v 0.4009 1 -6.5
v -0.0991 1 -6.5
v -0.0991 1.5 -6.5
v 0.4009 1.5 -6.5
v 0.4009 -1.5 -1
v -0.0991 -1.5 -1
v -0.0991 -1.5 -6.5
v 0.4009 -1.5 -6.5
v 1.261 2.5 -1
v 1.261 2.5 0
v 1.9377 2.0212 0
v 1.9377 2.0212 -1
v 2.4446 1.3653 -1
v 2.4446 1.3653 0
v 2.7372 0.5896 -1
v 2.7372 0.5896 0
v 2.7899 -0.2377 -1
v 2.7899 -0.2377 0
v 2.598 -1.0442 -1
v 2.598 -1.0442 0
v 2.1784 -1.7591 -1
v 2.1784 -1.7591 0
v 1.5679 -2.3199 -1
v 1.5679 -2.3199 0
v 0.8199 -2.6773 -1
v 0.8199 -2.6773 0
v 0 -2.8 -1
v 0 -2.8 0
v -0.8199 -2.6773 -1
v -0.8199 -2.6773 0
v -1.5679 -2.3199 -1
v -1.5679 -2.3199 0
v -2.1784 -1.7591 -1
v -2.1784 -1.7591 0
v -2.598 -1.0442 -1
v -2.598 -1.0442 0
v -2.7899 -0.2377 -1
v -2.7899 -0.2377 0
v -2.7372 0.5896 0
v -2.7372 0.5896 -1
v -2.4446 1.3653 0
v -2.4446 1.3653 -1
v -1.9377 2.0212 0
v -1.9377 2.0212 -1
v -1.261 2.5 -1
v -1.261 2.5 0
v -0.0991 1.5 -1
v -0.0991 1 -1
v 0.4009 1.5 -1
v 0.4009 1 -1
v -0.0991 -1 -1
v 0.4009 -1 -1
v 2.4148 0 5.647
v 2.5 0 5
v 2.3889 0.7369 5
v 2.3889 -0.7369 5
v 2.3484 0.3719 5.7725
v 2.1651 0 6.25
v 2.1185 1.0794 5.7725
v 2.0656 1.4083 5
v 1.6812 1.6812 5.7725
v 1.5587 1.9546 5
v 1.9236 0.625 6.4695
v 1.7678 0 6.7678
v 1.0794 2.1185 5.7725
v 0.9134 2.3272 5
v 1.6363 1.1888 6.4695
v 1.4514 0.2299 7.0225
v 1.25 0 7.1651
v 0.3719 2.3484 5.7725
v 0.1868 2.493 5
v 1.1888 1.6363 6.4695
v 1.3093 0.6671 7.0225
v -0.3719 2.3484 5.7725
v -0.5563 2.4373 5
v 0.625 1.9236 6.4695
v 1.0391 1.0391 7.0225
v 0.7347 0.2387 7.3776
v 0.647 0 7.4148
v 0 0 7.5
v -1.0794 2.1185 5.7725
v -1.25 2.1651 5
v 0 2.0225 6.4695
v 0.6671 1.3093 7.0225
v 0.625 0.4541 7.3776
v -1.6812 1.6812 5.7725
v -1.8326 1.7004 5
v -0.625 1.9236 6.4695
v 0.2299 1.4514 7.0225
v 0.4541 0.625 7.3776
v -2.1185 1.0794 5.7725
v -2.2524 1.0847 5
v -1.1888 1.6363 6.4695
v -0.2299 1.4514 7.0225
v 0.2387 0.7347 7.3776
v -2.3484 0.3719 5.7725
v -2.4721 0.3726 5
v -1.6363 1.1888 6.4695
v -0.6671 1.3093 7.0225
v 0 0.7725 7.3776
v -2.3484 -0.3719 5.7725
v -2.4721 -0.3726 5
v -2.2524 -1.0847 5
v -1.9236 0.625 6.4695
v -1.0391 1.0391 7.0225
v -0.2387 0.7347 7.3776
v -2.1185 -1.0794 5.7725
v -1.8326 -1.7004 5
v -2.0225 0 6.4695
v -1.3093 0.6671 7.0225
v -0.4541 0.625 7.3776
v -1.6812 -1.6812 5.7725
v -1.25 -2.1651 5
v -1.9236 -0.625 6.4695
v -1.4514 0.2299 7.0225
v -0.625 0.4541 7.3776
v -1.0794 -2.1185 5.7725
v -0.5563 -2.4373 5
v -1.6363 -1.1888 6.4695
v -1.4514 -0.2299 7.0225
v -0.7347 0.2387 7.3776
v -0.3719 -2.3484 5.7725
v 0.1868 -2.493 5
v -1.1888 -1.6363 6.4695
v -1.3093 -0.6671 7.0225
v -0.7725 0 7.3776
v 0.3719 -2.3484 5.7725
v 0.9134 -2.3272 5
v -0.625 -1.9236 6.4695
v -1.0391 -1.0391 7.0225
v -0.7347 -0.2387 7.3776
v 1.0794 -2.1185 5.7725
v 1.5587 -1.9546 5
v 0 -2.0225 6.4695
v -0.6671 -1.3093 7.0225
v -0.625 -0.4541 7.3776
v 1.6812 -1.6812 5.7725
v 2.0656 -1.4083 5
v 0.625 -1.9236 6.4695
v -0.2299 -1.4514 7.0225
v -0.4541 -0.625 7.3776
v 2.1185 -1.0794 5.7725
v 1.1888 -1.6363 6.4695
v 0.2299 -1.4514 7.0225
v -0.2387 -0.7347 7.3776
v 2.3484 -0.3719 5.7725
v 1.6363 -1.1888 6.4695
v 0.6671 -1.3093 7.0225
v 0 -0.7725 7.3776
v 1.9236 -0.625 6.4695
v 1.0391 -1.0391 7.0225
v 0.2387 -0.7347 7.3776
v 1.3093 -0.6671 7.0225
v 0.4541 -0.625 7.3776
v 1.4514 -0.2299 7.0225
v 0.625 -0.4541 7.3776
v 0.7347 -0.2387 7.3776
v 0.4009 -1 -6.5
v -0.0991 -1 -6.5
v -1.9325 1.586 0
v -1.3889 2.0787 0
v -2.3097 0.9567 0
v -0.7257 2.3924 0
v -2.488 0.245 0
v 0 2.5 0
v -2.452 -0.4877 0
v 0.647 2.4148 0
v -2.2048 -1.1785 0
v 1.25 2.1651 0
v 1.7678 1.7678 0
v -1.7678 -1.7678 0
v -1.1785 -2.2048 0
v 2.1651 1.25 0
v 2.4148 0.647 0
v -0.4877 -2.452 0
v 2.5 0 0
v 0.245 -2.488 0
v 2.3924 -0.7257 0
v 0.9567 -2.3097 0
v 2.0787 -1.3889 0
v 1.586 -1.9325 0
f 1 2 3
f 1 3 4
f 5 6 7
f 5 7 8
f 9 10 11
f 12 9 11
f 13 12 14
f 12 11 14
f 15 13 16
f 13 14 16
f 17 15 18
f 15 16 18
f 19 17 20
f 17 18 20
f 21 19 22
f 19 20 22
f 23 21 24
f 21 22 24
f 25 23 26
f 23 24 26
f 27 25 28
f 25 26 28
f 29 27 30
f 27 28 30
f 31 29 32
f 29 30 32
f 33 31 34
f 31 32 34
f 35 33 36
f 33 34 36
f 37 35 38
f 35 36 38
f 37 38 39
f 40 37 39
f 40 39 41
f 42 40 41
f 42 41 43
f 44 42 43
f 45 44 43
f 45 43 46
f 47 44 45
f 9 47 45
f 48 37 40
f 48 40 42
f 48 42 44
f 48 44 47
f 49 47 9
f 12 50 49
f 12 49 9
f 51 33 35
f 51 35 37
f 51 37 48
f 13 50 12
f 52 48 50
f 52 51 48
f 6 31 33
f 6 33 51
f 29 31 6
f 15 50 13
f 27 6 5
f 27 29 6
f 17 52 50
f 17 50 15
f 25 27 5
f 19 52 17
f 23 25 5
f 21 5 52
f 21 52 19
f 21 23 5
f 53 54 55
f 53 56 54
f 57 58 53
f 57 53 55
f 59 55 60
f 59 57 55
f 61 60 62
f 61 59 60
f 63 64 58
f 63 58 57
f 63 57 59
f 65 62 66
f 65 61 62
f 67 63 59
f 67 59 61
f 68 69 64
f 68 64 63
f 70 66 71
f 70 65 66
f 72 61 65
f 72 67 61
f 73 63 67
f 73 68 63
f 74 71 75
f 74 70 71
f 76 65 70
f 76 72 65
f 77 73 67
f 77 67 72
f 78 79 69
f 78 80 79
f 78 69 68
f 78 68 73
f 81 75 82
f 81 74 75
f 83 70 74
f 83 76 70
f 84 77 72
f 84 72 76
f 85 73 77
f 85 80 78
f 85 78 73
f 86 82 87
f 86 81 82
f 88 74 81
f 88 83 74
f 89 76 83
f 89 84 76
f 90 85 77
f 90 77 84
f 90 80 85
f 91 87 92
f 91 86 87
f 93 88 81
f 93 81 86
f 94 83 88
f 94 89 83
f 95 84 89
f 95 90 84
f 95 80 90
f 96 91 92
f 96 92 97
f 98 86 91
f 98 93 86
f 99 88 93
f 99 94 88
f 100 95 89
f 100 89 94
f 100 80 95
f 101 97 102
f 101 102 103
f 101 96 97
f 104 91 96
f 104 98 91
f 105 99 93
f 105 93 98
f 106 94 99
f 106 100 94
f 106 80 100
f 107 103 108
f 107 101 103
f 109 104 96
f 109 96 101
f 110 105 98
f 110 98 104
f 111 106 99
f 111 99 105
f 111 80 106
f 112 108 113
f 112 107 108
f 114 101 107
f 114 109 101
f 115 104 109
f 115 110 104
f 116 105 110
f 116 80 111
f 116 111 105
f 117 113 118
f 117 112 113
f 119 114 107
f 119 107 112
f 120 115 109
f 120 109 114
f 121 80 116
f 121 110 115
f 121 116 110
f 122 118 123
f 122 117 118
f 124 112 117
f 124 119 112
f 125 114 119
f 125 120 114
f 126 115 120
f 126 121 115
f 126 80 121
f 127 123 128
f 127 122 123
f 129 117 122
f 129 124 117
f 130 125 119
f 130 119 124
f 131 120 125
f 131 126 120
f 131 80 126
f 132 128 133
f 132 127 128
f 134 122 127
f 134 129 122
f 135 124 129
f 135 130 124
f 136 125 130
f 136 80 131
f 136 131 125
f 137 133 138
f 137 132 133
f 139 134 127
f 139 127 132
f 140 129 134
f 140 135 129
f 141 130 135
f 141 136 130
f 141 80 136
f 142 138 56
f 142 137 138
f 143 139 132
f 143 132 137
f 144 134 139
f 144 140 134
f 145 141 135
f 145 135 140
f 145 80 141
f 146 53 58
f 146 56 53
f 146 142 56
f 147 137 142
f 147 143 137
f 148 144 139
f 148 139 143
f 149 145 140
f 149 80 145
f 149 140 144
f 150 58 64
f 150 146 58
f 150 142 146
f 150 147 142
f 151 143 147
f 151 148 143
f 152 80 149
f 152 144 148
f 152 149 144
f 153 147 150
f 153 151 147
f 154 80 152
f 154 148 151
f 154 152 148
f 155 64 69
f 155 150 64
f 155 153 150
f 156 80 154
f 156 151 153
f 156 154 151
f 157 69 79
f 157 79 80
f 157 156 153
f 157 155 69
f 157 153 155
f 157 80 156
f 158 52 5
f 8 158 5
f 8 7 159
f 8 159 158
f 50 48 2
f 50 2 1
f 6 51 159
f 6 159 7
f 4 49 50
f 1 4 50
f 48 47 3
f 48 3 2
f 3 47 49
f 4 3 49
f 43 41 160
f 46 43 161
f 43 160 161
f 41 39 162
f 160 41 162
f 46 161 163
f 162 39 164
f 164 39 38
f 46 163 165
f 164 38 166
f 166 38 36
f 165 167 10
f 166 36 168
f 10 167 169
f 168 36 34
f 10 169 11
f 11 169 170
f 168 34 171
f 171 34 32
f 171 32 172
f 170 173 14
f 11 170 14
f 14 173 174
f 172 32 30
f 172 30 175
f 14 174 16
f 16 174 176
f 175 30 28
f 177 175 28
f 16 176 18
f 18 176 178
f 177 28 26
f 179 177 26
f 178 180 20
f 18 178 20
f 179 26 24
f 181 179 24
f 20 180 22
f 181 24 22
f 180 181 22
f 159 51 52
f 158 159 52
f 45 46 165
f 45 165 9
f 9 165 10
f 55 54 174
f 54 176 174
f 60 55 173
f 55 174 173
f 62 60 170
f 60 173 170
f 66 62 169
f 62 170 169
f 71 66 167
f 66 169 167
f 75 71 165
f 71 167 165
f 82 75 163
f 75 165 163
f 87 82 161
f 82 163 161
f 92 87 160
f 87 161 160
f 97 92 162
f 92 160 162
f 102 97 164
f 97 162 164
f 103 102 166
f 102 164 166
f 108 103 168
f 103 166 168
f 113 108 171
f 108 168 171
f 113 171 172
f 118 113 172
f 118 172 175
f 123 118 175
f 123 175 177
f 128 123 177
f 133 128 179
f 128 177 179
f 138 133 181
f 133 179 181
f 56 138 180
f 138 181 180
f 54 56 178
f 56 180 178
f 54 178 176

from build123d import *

# Parameters (mm, degrees)
F0_R     = 2.5
F1_DEPTH = 7.5
F2_R     = 2.5
F4_DEPTH = 1
F6_W     = 0.5
F6_H     = 0.5
F7_DEPTH = 5.5


with BuildPart() as f1:
    # F0 (on Top) → F1 (new body)
    with BuildSketch(Plane.XY):
        Circle(F0_R)
    extrude(amount=F1_DEPTH)

    # F2
    f2_edges = [f1.edges().sort_by_distance(p)[0] for p in [
        (-2.5, 0, 7.5),
    ]]
    fillet(f2_edges, radius=F2_R)

    # F3 (on face) → F4 (join)
    with BuildSketch(Plane(origin=(0, 0, 0), x_dir=(1, 0, 0), z_dir=(0, 0, -1))):
        with BuildLine():
            Line((-1.2609520213, -2.5), (1.2609520213, -2.5))
            ThreePointArc((1.2609520213, -2.5), (0, 2.8), (-1.2609520213, -2.5))
        make_face()
    extrude(amount=F4_DEPTH)

    # F6 (on offset) → F7 (join)
    with BuildSketch(Plane(origin=(0, 0, -1), x_dir=(1, 0, 0), z_dir=(0, 0, -1))):
        with Locations((0.1509, 1.25)):
            Rectangle(F6_W, F6_H)
        with Locations((0.1509, -1.25)):
            Rectangle(F6_W, F6_H)
    extrude(amount=F7_DEPTH)


solid = f1.part
